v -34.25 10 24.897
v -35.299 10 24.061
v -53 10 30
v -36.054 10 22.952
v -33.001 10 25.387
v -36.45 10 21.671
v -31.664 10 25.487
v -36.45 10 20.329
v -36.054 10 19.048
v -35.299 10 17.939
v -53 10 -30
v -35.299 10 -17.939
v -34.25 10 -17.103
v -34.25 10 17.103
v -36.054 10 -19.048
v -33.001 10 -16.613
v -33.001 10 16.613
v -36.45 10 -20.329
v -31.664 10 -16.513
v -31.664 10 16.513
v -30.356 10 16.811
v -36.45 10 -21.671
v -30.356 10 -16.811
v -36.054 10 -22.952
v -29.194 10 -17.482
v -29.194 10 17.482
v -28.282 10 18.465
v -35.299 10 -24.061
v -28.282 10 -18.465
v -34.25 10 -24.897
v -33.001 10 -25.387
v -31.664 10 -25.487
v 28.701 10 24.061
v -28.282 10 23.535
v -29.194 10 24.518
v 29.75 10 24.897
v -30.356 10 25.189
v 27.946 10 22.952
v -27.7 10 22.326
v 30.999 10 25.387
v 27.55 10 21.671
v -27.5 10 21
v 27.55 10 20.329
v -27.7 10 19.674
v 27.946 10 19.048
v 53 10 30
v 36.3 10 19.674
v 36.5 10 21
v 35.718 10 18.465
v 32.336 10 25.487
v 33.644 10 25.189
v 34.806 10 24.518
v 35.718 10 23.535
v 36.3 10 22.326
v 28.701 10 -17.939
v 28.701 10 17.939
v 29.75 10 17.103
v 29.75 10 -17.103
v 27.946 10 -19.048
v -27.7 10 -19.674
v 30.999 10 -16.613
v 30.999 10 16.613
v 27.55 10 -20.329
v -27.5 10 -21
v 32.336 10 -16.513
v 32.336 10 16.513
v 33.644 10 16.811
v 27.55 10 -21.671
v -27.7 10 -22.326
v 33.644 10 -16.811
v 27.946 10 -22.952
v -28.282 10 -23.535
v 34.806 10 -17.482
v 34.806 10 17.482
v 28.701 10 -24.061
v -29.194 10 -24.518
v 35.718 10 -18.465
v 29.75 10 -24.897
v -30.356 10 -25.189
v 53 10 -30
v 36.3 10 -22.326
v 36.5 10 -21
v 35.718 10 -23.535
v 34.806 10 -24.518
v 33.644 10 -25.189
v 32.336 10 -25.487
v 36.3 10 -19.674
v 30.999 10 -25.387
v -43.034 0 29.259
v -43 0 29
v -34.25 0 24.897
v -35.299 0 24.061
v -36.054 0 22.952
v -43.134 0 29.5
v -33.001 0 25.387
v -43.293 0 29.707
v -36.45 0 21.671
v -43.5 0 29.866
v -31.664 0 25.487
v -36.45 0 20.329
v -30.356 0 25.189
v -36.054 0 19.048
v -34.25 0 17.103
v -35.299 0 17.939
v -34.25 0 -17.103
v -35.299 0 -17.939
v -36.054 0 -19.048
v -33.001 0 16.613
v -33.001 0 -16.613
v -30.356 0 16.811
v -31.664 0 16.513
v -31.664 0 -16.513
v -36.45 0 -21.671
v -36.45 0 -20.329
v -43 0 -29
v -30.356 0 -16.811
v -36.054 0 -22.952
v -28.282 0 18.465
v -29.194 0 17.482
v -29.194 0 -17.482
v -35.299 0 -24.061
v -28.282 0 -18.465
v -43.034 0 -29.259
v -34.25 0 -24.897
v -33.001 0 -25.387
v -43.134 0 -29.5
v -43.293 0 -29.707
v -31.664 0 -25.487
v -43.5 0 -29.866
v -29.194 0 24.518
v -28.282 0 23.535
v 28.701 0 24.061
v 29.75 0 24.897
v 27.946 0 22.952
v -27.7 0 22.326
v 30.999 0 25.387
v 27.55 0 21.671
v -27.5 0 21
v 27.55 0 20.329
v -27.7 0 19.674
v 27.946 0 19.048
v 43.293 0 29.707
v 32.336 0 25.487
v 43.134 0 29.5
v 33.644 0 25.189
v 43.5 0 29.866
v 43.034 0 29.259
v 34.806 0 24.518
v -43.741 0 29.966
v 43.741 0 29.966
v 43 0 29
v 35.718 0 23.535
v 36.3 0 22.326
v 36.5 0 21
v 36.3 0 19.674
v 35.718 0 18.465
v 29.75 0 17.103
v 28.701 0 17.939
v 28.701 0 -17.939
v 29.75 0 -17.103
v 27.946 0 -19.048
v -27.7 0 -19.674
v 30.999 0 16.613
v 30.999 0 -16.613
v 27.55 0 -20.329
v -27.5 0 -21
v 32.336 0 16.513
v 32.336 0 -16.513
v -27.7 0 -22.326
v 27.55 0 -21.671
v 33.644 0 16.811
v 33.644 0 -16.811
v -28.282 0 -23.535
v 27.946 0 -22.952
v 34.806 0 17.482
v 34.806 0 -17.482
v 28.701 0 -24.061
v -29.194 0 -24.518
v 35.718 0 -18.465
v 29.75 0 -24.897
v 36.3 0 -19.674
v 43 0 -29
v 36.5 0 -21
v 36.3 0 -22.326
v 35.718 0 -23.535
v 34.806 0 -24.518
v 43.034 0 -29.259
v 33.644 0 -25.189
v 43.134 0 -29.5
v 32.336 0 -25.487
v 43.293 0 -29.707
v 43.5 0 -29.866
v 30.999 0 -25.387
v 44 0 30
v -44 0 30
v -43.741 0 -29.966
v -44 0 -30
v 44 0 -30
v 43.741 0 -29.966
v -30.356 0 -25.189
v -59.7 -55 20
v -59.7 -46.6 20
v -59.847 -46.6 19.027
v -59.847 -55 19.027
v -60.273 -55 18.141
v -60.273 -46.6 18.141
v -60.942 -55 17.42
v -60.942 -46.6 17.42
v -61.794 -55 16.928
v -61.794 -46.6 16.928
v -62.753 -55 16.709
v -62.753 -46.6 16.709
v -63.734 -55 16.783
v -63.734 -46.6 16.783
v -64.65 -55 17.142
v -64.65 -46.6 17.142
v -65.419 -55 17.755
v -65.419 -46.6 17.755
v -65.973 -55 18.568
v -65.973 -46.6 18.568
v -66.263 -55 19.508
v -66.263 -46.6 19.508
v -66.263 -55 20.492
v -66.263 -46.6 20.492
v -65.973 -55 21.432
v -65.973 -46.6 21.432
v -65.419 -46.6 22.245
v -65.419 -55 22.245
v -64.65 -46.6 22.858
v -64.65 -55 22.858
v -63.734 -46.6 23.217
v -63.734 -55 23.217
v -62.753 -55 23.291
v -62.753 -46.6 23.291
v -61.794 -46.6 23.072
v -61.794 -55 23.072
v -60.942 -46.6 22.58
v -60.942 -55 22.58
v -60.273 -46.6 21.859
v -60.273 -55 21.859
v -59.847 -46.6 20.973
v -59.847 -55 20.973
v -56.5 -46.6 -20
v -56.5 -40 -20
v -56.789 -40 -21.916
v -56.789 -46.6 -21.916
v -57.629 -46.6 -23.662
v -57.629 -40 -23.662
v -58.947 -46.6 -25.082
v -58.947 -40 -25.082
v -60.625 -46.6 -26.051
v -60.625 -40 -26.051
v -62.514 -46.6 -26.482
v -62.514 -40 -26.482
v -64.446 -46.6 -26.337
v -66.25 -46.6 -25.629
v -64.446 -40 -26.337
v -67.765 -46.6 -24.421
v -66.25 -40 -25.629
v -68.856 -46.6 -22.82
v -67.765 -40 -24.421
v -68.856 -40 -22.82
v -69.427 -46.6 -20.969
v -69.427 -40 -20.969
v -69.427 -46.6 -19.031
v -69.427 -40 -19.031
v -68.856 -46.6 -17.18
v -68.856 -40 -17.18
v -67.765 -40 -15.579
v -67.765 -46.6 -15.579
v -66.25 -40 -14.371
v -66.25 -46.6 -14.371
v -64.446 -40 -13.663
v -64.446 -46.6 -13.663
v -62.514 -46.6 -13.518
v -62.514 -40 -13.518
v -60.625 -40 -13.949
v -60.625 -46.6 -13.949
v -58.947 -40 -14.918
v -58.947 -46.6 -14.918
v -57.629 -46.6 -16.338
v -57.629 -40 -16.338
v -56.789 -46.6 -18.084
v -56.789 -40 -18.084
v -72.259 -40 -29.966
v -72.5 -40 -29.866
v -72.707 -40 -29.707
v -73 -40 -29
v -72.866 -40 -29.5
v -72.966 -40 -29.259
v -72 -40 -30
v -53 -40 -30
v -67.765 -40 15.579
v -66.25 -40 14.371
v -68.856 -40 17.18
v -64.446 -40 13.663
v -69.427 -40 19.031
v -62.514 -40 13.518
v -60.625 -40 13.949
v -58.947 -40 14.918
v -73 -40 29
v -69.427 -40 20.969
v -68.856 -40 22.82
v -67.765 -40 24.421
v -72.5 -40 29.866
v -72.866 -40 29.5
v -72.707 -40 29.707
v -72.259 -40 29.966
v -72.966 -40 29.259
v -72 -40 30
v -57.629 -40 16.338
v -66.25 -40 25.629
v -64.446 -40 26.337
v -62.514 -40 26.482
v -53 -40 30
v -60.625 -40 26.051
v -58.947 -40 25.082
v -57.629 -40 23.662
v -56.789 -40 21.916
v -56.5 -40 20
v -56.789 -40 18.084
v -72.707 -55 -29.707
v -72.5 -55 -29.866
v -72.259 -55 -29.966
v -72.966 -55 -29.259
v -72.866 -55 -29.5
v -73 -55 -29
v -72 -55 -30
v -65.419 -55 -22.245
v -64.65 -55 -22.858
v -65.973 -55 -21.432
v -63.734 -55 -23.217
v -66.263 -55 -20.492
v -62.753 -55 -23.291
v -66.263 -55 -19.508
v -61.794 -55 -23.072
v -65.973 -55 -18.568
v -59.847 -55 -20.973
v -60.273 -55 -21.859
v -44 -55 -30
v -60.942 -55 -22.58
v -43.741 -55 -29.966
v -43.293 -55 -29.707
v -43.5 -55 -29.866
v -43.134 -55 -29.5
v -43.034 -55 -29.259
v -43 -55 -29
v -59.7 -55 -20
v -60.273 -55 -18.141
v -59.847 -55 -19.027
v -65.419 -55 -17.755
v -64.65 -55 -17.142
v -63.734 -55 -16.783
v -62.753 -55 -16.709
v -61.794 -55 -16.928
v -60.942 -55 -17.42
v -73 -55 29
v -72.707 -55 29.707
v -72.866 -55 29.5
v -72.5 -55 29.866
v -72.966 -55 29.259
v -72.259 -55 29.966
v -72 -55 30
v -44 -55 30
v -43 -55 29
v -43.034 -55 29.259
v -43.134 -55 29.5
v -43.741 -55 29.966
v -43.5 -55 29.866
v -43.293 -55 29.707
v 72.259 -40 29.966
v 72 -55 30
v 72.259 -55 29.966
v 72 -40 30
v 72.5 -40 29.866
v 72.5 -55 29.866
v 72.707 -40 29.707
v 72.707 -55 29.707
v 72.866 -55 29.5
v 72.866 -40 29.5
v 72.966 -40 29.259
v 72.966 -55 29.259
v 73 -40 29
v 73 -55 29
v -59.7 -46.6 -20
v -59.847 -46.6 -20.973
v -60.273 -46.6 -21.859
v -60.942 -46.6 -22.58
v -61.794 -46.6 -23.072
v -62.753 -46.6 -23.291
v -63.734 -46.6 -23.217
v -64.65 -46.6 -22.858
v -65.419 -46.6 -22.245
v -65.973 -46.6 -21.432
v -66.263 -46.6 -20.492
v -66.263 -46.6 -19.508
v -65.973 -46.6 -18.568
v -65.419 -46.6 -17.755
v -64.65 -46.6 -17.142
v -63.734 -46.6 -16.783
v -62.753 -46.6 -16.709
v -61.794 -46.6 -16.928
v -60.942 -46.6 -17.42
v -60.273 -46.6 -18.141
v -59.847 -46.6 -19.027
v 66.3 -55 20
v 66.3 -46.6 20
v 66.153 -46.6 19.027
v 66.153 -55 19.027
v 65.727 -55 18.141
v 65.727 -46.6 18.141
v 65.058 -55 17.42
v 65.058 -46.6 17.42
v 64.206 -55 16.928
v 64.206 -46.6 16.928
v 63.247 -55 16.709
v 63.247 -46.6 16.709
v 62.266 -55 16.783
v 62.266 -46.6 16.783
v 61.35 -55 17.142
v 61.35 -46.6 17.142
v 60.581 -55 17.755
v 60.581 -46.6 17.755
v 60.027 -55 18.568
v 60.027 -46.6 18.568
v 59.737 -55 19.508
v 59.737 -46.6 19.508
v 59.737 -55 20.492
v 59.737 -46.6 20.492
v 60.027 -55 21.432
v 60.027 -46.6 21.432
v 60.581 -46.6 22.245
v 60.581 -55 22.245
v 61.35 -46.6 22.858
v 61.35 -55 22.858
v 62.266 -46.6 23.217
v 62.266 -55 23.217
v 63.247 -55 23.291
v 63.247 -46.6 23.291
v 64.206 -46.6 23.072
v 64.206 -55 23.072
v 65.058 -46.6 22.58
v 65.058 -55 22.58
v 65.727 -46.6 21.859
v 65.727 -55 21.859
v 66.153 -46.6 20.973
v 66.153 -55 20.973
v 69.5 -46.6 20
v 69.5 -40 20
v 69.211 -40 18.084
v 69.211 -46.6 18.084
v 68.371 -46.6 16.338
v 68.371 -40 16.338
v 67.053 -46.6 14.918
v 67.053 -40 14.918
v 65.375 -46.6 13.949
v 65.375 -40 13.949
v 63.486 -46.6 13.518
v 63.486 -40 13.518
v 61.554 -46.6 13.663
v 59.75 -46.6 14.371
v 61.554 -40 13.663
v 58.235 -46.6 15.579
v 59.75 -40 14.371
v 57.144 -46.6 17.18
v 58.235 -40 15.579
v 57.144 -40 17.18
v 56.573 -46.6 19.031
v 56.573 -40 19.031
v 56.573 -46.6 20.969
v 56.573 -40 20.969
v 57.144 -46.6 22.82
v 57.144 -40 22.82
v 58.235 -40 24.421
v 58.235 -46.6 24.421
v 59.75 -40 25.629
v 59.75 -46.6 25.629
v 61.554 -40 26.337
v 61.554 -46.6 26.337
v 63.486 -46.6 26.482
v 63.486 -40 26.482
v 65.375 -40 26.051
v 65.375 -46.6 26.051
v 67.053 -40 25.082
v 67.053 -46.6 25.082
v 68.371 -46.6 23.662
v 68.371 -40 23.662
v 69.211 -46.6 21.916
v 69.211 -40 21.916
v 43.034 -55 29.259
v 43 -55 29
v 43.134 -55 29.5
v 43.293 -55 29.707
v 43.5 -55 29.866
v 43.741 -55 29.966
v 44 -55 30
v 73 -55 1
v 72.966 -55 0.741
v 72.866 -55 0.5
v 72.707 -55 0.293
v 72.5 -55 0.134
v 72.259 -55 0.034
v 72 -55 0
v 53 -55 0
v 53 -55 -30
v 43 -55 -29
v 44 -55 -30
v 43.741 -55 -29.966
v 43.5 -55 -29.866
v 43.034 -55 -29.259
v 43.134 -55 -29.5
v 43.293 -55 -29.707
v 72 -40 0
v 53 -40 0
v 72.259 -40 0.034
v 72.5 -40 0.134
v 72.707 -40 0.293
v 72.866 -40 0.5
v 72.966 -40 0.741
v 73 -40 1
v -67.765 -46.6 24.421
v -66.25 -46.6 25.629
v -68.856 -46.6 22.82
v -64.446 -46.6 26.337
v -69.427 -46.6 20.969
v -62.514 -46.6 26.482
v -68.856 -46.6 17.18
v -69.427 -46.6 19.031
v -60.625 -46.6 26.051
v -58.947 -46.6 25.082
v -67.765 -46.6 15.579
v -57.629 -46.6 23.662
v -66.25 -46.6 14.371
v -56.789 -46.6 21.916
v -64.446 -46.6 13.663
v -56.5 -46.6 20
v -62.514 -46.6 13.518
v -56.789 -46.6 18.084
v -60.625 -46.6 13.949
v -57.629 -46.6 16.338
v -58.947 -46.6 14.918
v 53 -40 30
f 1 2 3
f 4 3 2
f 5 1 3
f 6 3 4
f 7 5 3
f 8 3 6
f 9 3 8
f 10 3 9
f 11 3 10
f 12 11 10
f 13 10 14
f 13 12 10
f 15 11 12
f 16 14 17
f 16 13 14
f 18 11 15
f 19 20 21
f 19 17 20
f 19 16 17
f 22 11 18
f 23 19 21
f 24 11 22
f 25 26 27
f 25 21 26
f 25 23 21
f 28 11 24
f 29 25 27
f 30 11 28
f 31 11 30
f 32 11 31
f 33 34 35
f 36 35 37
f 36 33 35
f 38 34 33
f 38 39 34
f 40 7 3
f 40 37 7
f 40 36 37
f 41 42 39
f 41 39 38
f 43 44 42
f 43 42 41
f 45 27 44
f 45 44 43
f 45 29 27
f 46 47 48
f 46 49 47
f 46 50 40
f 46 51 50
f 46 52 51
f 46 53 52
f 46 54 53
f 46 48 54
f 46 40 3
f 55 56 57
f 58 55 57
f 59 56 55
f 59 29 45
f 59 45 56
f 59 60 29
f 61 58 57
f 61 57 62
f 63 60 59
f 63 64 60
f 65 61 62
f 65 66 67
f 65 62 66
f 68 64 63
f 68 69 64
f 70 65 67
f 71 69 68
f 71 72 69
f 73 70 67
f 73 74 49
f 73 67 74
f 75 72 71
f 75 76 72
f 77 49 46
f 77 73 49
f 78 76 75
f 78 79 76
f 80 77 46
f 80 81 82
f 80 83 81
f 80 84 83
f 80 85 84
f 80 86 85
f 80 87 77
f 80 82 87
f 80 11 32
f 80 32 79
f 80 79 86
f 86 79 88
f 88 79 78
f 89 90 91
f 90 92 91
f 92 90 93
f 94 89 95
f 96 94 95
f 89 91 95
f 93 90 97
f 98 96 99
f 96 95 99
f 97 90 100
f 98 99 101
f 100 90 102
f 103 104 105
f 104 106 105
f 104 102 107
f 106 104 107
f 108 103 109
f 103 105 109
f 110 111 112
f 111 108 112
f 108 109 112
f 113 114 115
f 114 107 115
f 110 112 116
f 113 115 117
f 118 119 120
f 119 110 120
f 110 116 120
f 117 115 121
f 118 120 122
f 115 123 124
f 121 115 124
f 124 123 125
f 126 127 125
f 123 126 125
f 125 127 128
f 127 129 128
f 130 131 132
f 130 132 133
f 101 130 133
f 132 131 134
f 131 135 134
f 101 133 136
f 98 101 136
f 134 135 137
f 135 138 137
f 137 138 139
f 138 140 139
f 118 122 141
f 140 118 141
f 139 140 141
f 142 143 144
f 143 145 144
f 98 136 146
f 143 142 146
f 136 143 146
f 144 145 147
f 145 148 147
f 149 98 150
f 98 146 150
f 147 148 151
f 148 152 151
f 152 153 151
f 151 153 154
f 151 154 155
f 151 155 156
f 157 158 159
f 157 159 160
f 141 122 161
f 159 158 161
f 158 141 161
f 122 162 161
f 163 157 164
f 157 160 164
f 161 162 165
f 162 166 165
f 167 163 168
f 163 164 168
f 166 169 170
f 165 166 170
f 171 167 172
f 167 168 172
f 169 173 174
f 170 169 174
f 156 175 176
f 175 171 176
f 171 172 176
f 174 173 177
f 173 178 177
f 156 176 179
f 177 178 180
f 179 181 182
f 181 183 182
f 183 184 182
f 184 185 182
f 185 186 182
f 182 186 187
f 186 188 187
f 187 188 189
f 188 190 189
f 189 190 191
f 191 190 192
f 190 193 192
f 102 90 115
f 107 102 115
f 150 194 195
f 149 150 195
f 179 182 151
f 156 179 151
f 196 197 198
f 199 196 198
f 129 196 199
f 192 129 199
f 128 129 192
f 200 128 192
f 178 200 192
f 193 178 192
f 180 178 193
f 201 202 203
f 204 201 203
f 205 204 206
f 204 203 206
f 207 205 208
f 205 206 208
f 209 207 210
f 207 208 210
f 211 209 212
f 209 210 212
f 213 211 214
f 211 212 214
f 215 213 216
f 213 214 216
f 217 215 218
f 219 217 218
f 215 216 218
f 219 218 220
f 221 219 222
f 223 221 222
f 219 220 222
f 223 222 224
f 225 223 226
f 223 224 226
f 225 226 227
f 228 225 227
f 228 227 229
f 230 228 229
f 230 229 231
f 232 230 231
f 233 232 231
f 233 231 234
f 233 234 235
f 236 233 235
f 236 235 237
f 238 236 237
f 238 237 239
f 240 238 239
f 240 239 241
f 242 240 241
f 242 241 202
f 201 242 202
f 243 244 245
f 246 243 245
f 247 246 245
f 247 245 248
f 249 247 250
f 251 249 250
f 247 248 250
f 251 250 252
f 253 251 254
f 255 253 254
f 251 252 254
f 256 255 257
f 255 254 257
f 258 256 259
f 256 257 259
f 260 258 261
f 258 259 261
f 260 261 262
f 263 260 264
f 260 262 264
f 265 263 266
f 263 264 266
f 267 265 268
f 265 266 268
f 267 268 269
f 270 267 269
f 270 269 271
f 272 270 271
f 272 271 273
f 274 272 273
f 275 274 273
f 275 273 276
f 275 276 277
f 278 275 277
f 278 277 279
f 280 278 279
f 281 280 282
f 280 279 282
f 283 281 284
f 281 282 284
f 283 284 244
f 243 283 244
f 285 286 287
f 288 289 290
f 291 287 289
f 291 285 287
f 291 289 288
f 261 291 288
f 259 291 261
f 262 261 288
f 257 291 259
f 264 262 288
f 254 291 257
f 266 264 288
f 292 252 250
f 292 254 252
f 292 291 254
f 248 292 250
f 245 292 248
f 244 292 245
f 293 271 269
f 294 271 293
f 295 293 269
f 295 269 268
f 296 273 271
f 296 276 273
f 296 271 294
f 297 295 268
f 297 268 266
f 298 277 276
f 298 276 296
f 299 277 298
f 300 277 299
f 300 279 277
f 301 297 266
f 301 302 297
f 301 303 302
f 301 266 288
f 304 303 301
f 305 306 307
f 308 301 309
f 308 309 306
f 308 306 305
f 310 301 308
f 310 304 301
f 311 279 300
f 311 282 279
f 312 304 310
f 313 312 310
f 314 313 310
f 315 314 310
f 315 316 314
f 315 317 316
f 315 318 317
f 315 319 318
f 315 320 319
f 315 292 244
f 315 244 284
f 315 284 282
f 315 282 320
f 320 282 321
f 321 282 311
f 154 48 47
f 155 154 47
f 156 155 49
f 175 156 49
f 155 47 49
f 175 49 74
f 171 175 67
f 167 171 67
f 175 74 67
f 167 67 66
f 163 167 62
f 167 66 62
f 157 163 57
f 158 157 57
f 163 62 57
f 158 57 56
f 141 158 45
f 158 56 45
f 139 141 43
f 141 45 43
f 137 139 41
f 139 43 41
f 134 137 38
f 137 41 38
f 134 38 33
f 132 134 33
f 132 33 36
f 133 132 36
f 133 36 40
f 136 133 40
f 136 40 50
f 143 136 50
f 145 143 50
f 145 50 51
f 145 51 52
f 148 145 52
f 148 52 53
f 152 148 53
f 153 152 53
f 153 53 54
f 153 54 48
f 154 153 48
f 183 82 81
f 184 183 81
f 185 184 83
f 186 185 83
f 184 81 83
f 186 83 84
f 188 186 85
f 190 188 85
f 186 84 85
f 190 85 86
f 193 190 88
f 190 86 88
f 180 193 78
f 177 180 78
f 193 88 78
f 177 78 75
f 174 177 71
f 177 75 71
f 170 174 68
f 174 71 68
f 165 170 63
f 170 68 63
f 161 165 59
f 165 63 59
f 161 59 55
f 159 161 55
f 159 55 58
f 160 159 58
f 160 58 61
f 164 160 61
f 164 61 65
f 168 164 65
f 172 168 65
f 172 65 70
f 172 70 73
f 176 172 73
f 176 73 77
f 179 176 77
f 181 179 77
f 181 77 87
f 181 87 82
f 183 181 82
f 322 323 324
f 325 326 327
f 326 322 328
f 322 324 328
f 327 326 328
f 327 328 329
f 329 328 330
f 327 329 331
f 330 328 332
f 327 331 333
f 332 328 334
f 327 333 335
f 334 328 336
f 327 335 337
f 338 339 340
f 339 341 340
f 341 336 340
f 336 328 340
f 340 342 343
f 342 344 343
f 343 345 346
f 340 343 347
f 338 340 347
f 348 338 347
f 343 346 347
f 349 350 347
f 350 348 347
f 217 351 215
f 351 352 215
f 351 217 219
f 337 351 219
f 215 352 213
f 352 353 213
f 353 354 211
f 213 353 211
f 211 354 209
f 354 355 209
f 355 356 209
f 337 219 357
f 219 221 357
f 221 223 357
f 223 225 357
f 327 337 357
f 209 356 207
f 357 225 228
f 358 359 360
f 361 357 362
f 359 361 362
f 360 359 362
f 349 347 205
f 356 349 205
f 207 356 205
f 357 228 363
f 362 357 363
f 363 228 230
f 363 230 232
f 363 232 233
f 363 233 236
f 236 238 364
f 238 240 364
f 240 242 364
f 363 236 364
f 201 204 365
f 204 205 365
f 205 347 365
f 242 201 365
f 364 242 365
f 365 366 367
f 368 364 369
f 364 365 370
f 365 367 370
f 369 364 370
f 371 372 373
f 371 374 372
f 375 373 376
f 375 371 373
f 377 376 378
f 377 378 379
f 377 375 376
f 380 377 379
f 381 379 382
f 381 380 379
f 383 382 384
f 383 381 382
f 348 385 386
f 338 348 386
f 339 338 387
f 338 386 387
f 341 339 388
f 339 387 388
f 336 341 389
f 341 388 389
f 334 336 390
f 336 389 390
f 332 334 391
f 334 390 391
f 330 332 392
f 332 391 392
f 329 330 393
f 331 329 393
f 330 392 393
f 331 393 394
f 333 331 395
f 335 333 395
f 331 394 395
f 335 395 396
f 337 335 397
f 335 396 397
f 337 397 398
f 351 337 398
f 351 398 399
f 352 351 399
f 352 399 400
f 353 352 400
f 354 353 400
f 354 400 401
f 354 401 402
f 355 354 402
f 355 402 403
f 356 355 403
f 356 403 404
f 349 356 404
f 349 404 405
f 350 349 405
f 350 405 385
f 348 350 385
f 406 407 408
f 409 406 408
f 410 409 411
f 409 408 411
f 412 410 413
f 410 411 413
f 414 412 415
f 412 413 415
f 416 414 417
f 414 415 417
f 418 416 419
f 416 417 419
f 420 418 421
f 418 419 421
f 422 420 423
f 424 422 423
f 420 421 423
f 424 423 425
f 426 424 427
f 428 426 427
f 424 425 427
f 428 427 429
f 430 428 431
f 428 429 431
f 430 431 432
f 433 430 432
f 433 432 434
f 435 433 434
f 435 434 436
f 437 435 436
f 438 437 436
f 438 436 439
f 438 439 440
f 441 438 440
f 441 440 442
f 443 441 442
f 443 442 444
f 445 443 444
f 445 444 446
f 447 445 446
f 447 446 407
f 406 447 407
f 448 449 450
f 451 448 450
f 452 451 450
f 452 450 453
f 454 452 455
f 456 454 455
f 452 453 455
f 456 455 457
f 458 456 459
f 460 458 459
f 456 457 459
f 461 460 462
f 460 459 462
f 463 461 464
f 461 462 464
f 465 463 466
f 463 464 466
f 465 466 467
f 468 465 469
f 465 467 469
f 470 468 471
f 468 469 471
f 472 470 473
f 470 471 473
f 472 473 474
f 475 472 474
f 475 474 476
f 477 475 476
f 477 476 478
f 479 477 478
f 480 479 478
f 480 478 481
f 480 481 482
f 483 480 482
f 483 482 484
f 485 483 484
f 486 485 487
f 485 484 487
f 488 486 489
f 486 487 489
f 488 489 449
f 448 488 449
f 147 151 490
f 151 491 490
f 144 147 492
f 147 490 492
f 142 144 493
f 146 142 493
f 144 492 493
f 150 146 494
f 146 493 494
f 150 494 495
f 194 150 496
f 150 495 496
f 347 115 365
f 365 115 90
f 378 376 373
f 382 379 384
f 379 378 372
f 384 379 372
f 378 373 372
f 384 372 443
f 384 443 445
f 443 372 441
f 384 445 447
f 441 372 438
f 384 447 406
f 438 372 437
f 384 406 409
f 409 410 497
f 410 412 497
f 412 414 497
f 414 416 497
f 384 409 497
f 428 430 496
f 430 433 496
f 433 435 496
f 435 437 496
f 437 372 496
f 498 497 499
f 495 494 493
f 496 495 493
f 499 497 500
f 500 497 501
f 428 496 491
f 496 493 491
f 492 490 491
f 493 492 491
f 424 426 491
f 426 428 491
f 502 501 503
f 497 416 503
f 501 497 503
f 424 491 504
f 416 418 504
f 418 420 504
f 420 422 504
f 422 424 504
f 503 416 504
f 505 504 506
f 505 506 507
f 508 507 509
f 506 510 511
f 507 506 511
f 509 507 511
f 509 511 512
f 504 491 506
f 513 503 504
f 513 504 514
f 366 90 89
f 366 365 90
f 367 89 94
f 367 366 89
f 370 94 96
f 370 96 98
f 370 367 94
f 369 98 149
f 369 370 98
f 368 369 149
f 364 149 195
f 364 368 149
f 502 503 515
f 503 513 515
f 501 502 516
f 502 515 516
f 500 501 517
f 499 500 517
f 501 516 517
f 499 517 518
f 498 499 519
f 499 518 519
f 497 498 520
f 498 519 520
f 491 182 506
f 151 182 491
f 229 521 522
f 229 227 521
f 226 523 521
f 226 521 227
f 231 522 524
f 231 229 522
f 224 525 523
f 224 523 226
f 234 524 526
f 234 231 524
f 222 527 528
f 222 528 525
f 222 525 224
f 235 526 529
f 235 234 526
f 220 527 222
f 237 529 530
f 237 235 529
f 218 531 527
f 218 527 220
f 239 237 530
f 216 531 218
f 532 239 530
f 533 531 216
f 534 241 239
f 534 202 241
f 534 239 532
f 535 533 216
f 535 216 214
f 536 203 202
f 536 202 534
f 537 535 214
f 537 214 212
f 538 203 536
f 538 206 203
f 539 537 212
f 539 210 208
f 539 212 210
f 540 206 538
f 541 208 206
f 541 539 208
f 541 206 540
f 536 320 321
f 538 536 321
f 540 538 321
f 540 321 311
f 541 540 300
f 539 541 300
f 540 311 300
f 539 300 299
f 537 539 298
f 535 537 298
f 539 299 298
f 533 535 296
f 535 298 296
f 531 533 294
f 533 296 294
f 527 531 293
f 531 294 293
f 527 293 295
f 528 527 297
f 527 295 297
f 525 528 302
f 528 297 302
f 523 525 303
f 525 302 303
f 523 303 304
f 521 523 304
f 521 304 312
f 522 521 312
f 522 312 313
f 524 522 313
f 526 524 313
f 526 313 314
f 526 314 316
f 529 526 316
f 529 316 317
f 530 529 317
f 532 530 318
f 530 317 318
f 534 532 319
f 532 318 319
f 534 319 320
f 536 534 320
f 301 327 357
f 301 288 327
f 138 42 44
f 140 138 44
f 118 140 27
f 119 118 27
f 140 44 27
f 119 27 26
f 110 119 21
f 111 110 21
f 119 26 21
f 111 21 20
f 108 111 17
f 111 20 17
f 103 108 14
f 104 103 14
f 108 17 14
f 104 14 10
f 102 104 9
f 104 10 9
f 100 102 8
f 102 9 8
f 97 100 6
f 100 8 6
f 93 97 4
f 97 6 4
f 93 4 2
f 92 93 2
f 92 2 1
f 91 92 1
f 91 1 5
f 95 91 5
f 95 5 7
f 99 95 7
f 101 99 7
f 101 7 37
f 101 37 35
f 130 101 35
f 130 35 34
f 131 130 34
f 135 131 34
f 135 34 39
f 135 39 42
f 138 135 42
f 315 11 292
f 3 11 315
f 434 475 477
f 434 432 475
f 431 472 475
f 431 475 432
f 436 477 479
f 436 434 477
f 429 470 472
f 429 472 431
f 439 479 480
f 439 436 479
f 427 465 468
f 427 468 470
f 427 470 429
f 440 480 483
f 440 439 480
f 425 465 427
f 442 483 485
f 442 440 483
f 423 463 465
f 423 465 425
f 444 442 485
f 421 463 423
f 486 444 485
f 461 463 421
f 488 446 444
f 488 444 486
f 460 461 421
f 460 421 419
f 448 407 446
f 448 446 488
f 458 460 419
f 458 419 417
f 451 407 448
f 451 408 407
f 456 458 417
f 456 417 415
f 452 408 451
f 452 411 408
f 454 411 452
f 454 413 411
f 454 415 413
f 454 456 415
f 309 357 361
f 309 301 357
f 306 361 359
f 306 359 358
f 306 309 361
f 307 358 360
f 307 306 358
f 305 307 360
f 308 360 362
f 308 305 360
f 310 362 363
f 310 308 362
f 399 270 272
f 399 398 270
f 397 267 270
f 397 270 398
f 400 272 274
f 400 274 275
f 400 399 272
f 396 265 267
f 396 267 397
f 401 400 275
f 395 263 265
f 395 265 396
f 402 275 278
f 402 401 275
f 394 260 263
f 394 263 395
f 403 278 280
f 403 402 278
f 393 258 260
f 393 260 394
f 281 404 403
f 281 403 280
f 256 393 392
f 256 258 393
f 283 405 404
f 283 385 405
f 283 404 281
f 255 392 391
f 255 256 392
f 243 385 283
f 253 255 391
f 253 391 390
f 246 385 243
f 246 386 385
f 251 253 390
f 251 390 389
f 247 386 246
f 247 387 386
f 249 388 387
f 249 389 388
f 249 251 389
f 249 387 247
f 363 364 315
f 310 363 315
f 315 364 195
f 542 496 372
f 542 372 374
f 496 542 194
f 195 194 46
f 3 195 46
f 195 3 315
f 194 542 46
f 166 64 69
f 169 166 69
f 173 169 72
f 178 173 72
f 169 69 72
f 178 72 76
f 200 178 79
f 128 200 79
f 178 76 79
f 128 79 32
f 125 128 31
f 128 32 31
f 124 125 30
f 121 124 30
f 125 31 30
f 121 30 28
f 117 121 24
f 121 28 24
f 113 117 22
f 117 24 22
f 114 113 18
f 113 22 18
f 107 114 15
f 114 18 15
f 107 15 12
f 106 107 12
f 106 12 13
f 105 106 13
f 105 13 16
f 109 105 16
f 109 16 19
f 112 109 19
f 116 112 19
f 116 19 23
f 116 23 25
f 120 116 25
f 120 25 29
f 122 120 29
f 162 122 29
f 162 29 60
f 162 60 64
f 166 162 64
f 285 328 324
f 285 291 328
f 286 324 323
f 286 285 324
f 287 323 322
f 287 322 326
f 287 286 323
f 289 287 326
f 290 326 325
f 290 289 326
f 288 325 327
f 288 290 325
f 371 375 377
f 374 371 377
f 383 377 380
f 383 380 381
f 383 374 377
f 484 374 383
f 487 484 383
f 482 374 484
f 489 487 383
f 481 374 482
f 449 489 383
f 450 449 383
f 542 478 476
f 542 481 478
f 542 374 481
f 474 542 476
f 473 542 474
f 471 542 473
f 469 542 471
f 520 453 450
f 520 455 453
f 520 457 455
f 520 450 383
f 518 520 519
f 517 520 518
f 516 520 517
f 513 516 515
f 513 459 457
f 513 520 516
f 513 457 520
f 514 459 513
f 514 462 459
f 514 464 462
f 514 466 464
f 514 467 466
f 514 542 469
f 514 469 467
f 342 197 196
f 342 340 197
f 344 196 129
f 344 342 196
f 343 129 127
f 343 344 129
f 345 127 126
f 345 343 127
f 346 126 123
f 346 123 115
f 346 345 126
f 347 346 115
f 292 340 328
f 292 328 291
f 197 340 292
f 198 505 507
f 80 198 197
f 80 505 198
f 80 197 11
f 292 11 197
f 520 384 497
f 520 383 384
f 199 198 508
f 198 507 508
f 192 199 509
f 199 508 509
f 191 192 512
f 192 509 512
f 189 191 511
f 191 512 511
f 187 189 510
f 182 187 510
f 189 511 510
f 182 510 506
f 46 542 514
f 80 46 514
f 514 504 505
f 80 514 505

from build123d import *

# Parameters (mm, degrees)
SKETCH1_W           = 106
SKETCH1_H           = 60
BOSS_EXTRUDE1_DEPTH = 10
SKETCH2_W           = 10
SKETCH2_H           = 60
BOSS_EXTRUDE2_DEPTH = 55
SKETCH3_W           = 30
SKETCH3_H           = 15
BOSS_EXTRUDE3_DEPTH = 20
SKETCH4_W           = 60
SKETCH4_H           = 15
BOSS_EXTRUDE4_DEPTH = 20
SKETCH5_R           = 4.5
CUT_EXTRUDE1_DEPTH  = 66
SKETCH6_R           = 6.5
CUT_EXTRUDE2_DEPTH  = 6.6
SKETCH7_R           = 3.3
CUT_EXTRUDE3_DEPTH  = 9.4
FILLET1_R           = 1


with BuildPart() as part:
    # Sketch1 → Boss-Extrude1 (new body)
    with BuildSketch(Plane(origin=(0, 0, 0), x_dir=(1, 0, 0), z_dir=(0, 1, 0))):
        Rectangle(SKETCH1_W, SKETCH1_H)
    extrude(amount=BOSS_EXTRUDE1_DEPTH)

    # Sketch2 → Boss-Extrude2 (add)
    with BuildSketch(Plane.XZ):
        with Locations((-48, 0)):
            Rectangle(SKETCH2_W, SKETCH2_H)
        with Locations((48, 0)):
            Rectangle(SKETCH2_W, SKETCH2_H)
    extrude(amount=BOSS_EXTRUDE2_DEPTH)

    # Sketch3 → Boss-Extrude3 (add)
    with BuildSketch(Plane(origin=(53, 0, 0), x_dir=(0, 0, -1), z_dir=(1, 0, 0))):
        with Locations((-15, -47.5)):
            Rectangle(SKETCH3_W, SKETCH3_H)
    extrude(amount=BOSS_EXTRUDE3_DEPTH)

    # Sketch4 → Boss-Extrude4 (add)
    with BuildSketch(Plane.ZY.offset(53)):
        with Locations((0, -47.5)):
            Rectangle(SKETCH4_W, SKETCH4_H)
    extrude(amount=BOSS_EXTRUDE4_DEPTH)

    # Sketch5 → Cut-Extrude1 (cut, through all)
    with BuildSketch(Plane(origin=(0, 10, 0), x_dir=(1, 0, 0), z_dir=(0, 1, 0))):
        with Locations((-32, 21)):
            Circle(SKETCH5_R)
        with Locations((32, 21)):
            Circle(SKETCH5_R)
        with Locations((32, -21)):
            Circle(SKETCH5_R)
        with Locations((-32, -21)):
            Circle(SKETCH5_R)
    extrude(amount=-CUT_EXTRUDE1_DEPTH, mode=Mode.SUBTRACT)

    # Sketch6 → Cut-Extrude2 (cut)
    with BuildSketch(Plane(origin=(0, -40, 0), x_dir=(1, 0, 0), z_dir=(0, 1, 0))):
        with Locations((63, -20)):
            Circle(SKETCH6_R)
        with Locations((-63, 20)):
            Circle(SKETCH6_R)
        with Locations((-63, -20)):
            Circle(SKETCH6_R)
    extrude(amount=-CUT_EXTRUDE2_DEPTH, mode=Mode.SUBTRACT)

    # Sketch7 → Cut-Extrude3 (cut, through all)
    with BuildSketch(Plane(origin=(0, -46.6, 0), x_dir=(1, 0, 0), z_dir=(0, 1, 0))):
        with Locations((-63, 20)):
            Circle(SKETCH7_R)
        with Locations((-63, -20)):
            Circle(SKETCH7_R)
        with Locations((63, -20)):
            Circle(SKETCH7_R)
    extrude(amount=-CUT_EXTRUDE3_DEPTH, mode=Mode.SUBTRACT)

    # Fillet1
    fillet1_edges = [part.edges().sort_by_distance(p)[0] for p in [
        (-43, -27.5, -30),
        (-43, -27.5, 30),
        (43, -27.5, 30),
        (43, -27.5, -30),
        (73, -47.5, 30),
        (73, -47.5, 0),
        (-73, -47.5, -30),
        (-73, -47.5, 30),
    ]]
    fillet(fillet1_edges, radius=FILLET1_R)


solid = part.part
